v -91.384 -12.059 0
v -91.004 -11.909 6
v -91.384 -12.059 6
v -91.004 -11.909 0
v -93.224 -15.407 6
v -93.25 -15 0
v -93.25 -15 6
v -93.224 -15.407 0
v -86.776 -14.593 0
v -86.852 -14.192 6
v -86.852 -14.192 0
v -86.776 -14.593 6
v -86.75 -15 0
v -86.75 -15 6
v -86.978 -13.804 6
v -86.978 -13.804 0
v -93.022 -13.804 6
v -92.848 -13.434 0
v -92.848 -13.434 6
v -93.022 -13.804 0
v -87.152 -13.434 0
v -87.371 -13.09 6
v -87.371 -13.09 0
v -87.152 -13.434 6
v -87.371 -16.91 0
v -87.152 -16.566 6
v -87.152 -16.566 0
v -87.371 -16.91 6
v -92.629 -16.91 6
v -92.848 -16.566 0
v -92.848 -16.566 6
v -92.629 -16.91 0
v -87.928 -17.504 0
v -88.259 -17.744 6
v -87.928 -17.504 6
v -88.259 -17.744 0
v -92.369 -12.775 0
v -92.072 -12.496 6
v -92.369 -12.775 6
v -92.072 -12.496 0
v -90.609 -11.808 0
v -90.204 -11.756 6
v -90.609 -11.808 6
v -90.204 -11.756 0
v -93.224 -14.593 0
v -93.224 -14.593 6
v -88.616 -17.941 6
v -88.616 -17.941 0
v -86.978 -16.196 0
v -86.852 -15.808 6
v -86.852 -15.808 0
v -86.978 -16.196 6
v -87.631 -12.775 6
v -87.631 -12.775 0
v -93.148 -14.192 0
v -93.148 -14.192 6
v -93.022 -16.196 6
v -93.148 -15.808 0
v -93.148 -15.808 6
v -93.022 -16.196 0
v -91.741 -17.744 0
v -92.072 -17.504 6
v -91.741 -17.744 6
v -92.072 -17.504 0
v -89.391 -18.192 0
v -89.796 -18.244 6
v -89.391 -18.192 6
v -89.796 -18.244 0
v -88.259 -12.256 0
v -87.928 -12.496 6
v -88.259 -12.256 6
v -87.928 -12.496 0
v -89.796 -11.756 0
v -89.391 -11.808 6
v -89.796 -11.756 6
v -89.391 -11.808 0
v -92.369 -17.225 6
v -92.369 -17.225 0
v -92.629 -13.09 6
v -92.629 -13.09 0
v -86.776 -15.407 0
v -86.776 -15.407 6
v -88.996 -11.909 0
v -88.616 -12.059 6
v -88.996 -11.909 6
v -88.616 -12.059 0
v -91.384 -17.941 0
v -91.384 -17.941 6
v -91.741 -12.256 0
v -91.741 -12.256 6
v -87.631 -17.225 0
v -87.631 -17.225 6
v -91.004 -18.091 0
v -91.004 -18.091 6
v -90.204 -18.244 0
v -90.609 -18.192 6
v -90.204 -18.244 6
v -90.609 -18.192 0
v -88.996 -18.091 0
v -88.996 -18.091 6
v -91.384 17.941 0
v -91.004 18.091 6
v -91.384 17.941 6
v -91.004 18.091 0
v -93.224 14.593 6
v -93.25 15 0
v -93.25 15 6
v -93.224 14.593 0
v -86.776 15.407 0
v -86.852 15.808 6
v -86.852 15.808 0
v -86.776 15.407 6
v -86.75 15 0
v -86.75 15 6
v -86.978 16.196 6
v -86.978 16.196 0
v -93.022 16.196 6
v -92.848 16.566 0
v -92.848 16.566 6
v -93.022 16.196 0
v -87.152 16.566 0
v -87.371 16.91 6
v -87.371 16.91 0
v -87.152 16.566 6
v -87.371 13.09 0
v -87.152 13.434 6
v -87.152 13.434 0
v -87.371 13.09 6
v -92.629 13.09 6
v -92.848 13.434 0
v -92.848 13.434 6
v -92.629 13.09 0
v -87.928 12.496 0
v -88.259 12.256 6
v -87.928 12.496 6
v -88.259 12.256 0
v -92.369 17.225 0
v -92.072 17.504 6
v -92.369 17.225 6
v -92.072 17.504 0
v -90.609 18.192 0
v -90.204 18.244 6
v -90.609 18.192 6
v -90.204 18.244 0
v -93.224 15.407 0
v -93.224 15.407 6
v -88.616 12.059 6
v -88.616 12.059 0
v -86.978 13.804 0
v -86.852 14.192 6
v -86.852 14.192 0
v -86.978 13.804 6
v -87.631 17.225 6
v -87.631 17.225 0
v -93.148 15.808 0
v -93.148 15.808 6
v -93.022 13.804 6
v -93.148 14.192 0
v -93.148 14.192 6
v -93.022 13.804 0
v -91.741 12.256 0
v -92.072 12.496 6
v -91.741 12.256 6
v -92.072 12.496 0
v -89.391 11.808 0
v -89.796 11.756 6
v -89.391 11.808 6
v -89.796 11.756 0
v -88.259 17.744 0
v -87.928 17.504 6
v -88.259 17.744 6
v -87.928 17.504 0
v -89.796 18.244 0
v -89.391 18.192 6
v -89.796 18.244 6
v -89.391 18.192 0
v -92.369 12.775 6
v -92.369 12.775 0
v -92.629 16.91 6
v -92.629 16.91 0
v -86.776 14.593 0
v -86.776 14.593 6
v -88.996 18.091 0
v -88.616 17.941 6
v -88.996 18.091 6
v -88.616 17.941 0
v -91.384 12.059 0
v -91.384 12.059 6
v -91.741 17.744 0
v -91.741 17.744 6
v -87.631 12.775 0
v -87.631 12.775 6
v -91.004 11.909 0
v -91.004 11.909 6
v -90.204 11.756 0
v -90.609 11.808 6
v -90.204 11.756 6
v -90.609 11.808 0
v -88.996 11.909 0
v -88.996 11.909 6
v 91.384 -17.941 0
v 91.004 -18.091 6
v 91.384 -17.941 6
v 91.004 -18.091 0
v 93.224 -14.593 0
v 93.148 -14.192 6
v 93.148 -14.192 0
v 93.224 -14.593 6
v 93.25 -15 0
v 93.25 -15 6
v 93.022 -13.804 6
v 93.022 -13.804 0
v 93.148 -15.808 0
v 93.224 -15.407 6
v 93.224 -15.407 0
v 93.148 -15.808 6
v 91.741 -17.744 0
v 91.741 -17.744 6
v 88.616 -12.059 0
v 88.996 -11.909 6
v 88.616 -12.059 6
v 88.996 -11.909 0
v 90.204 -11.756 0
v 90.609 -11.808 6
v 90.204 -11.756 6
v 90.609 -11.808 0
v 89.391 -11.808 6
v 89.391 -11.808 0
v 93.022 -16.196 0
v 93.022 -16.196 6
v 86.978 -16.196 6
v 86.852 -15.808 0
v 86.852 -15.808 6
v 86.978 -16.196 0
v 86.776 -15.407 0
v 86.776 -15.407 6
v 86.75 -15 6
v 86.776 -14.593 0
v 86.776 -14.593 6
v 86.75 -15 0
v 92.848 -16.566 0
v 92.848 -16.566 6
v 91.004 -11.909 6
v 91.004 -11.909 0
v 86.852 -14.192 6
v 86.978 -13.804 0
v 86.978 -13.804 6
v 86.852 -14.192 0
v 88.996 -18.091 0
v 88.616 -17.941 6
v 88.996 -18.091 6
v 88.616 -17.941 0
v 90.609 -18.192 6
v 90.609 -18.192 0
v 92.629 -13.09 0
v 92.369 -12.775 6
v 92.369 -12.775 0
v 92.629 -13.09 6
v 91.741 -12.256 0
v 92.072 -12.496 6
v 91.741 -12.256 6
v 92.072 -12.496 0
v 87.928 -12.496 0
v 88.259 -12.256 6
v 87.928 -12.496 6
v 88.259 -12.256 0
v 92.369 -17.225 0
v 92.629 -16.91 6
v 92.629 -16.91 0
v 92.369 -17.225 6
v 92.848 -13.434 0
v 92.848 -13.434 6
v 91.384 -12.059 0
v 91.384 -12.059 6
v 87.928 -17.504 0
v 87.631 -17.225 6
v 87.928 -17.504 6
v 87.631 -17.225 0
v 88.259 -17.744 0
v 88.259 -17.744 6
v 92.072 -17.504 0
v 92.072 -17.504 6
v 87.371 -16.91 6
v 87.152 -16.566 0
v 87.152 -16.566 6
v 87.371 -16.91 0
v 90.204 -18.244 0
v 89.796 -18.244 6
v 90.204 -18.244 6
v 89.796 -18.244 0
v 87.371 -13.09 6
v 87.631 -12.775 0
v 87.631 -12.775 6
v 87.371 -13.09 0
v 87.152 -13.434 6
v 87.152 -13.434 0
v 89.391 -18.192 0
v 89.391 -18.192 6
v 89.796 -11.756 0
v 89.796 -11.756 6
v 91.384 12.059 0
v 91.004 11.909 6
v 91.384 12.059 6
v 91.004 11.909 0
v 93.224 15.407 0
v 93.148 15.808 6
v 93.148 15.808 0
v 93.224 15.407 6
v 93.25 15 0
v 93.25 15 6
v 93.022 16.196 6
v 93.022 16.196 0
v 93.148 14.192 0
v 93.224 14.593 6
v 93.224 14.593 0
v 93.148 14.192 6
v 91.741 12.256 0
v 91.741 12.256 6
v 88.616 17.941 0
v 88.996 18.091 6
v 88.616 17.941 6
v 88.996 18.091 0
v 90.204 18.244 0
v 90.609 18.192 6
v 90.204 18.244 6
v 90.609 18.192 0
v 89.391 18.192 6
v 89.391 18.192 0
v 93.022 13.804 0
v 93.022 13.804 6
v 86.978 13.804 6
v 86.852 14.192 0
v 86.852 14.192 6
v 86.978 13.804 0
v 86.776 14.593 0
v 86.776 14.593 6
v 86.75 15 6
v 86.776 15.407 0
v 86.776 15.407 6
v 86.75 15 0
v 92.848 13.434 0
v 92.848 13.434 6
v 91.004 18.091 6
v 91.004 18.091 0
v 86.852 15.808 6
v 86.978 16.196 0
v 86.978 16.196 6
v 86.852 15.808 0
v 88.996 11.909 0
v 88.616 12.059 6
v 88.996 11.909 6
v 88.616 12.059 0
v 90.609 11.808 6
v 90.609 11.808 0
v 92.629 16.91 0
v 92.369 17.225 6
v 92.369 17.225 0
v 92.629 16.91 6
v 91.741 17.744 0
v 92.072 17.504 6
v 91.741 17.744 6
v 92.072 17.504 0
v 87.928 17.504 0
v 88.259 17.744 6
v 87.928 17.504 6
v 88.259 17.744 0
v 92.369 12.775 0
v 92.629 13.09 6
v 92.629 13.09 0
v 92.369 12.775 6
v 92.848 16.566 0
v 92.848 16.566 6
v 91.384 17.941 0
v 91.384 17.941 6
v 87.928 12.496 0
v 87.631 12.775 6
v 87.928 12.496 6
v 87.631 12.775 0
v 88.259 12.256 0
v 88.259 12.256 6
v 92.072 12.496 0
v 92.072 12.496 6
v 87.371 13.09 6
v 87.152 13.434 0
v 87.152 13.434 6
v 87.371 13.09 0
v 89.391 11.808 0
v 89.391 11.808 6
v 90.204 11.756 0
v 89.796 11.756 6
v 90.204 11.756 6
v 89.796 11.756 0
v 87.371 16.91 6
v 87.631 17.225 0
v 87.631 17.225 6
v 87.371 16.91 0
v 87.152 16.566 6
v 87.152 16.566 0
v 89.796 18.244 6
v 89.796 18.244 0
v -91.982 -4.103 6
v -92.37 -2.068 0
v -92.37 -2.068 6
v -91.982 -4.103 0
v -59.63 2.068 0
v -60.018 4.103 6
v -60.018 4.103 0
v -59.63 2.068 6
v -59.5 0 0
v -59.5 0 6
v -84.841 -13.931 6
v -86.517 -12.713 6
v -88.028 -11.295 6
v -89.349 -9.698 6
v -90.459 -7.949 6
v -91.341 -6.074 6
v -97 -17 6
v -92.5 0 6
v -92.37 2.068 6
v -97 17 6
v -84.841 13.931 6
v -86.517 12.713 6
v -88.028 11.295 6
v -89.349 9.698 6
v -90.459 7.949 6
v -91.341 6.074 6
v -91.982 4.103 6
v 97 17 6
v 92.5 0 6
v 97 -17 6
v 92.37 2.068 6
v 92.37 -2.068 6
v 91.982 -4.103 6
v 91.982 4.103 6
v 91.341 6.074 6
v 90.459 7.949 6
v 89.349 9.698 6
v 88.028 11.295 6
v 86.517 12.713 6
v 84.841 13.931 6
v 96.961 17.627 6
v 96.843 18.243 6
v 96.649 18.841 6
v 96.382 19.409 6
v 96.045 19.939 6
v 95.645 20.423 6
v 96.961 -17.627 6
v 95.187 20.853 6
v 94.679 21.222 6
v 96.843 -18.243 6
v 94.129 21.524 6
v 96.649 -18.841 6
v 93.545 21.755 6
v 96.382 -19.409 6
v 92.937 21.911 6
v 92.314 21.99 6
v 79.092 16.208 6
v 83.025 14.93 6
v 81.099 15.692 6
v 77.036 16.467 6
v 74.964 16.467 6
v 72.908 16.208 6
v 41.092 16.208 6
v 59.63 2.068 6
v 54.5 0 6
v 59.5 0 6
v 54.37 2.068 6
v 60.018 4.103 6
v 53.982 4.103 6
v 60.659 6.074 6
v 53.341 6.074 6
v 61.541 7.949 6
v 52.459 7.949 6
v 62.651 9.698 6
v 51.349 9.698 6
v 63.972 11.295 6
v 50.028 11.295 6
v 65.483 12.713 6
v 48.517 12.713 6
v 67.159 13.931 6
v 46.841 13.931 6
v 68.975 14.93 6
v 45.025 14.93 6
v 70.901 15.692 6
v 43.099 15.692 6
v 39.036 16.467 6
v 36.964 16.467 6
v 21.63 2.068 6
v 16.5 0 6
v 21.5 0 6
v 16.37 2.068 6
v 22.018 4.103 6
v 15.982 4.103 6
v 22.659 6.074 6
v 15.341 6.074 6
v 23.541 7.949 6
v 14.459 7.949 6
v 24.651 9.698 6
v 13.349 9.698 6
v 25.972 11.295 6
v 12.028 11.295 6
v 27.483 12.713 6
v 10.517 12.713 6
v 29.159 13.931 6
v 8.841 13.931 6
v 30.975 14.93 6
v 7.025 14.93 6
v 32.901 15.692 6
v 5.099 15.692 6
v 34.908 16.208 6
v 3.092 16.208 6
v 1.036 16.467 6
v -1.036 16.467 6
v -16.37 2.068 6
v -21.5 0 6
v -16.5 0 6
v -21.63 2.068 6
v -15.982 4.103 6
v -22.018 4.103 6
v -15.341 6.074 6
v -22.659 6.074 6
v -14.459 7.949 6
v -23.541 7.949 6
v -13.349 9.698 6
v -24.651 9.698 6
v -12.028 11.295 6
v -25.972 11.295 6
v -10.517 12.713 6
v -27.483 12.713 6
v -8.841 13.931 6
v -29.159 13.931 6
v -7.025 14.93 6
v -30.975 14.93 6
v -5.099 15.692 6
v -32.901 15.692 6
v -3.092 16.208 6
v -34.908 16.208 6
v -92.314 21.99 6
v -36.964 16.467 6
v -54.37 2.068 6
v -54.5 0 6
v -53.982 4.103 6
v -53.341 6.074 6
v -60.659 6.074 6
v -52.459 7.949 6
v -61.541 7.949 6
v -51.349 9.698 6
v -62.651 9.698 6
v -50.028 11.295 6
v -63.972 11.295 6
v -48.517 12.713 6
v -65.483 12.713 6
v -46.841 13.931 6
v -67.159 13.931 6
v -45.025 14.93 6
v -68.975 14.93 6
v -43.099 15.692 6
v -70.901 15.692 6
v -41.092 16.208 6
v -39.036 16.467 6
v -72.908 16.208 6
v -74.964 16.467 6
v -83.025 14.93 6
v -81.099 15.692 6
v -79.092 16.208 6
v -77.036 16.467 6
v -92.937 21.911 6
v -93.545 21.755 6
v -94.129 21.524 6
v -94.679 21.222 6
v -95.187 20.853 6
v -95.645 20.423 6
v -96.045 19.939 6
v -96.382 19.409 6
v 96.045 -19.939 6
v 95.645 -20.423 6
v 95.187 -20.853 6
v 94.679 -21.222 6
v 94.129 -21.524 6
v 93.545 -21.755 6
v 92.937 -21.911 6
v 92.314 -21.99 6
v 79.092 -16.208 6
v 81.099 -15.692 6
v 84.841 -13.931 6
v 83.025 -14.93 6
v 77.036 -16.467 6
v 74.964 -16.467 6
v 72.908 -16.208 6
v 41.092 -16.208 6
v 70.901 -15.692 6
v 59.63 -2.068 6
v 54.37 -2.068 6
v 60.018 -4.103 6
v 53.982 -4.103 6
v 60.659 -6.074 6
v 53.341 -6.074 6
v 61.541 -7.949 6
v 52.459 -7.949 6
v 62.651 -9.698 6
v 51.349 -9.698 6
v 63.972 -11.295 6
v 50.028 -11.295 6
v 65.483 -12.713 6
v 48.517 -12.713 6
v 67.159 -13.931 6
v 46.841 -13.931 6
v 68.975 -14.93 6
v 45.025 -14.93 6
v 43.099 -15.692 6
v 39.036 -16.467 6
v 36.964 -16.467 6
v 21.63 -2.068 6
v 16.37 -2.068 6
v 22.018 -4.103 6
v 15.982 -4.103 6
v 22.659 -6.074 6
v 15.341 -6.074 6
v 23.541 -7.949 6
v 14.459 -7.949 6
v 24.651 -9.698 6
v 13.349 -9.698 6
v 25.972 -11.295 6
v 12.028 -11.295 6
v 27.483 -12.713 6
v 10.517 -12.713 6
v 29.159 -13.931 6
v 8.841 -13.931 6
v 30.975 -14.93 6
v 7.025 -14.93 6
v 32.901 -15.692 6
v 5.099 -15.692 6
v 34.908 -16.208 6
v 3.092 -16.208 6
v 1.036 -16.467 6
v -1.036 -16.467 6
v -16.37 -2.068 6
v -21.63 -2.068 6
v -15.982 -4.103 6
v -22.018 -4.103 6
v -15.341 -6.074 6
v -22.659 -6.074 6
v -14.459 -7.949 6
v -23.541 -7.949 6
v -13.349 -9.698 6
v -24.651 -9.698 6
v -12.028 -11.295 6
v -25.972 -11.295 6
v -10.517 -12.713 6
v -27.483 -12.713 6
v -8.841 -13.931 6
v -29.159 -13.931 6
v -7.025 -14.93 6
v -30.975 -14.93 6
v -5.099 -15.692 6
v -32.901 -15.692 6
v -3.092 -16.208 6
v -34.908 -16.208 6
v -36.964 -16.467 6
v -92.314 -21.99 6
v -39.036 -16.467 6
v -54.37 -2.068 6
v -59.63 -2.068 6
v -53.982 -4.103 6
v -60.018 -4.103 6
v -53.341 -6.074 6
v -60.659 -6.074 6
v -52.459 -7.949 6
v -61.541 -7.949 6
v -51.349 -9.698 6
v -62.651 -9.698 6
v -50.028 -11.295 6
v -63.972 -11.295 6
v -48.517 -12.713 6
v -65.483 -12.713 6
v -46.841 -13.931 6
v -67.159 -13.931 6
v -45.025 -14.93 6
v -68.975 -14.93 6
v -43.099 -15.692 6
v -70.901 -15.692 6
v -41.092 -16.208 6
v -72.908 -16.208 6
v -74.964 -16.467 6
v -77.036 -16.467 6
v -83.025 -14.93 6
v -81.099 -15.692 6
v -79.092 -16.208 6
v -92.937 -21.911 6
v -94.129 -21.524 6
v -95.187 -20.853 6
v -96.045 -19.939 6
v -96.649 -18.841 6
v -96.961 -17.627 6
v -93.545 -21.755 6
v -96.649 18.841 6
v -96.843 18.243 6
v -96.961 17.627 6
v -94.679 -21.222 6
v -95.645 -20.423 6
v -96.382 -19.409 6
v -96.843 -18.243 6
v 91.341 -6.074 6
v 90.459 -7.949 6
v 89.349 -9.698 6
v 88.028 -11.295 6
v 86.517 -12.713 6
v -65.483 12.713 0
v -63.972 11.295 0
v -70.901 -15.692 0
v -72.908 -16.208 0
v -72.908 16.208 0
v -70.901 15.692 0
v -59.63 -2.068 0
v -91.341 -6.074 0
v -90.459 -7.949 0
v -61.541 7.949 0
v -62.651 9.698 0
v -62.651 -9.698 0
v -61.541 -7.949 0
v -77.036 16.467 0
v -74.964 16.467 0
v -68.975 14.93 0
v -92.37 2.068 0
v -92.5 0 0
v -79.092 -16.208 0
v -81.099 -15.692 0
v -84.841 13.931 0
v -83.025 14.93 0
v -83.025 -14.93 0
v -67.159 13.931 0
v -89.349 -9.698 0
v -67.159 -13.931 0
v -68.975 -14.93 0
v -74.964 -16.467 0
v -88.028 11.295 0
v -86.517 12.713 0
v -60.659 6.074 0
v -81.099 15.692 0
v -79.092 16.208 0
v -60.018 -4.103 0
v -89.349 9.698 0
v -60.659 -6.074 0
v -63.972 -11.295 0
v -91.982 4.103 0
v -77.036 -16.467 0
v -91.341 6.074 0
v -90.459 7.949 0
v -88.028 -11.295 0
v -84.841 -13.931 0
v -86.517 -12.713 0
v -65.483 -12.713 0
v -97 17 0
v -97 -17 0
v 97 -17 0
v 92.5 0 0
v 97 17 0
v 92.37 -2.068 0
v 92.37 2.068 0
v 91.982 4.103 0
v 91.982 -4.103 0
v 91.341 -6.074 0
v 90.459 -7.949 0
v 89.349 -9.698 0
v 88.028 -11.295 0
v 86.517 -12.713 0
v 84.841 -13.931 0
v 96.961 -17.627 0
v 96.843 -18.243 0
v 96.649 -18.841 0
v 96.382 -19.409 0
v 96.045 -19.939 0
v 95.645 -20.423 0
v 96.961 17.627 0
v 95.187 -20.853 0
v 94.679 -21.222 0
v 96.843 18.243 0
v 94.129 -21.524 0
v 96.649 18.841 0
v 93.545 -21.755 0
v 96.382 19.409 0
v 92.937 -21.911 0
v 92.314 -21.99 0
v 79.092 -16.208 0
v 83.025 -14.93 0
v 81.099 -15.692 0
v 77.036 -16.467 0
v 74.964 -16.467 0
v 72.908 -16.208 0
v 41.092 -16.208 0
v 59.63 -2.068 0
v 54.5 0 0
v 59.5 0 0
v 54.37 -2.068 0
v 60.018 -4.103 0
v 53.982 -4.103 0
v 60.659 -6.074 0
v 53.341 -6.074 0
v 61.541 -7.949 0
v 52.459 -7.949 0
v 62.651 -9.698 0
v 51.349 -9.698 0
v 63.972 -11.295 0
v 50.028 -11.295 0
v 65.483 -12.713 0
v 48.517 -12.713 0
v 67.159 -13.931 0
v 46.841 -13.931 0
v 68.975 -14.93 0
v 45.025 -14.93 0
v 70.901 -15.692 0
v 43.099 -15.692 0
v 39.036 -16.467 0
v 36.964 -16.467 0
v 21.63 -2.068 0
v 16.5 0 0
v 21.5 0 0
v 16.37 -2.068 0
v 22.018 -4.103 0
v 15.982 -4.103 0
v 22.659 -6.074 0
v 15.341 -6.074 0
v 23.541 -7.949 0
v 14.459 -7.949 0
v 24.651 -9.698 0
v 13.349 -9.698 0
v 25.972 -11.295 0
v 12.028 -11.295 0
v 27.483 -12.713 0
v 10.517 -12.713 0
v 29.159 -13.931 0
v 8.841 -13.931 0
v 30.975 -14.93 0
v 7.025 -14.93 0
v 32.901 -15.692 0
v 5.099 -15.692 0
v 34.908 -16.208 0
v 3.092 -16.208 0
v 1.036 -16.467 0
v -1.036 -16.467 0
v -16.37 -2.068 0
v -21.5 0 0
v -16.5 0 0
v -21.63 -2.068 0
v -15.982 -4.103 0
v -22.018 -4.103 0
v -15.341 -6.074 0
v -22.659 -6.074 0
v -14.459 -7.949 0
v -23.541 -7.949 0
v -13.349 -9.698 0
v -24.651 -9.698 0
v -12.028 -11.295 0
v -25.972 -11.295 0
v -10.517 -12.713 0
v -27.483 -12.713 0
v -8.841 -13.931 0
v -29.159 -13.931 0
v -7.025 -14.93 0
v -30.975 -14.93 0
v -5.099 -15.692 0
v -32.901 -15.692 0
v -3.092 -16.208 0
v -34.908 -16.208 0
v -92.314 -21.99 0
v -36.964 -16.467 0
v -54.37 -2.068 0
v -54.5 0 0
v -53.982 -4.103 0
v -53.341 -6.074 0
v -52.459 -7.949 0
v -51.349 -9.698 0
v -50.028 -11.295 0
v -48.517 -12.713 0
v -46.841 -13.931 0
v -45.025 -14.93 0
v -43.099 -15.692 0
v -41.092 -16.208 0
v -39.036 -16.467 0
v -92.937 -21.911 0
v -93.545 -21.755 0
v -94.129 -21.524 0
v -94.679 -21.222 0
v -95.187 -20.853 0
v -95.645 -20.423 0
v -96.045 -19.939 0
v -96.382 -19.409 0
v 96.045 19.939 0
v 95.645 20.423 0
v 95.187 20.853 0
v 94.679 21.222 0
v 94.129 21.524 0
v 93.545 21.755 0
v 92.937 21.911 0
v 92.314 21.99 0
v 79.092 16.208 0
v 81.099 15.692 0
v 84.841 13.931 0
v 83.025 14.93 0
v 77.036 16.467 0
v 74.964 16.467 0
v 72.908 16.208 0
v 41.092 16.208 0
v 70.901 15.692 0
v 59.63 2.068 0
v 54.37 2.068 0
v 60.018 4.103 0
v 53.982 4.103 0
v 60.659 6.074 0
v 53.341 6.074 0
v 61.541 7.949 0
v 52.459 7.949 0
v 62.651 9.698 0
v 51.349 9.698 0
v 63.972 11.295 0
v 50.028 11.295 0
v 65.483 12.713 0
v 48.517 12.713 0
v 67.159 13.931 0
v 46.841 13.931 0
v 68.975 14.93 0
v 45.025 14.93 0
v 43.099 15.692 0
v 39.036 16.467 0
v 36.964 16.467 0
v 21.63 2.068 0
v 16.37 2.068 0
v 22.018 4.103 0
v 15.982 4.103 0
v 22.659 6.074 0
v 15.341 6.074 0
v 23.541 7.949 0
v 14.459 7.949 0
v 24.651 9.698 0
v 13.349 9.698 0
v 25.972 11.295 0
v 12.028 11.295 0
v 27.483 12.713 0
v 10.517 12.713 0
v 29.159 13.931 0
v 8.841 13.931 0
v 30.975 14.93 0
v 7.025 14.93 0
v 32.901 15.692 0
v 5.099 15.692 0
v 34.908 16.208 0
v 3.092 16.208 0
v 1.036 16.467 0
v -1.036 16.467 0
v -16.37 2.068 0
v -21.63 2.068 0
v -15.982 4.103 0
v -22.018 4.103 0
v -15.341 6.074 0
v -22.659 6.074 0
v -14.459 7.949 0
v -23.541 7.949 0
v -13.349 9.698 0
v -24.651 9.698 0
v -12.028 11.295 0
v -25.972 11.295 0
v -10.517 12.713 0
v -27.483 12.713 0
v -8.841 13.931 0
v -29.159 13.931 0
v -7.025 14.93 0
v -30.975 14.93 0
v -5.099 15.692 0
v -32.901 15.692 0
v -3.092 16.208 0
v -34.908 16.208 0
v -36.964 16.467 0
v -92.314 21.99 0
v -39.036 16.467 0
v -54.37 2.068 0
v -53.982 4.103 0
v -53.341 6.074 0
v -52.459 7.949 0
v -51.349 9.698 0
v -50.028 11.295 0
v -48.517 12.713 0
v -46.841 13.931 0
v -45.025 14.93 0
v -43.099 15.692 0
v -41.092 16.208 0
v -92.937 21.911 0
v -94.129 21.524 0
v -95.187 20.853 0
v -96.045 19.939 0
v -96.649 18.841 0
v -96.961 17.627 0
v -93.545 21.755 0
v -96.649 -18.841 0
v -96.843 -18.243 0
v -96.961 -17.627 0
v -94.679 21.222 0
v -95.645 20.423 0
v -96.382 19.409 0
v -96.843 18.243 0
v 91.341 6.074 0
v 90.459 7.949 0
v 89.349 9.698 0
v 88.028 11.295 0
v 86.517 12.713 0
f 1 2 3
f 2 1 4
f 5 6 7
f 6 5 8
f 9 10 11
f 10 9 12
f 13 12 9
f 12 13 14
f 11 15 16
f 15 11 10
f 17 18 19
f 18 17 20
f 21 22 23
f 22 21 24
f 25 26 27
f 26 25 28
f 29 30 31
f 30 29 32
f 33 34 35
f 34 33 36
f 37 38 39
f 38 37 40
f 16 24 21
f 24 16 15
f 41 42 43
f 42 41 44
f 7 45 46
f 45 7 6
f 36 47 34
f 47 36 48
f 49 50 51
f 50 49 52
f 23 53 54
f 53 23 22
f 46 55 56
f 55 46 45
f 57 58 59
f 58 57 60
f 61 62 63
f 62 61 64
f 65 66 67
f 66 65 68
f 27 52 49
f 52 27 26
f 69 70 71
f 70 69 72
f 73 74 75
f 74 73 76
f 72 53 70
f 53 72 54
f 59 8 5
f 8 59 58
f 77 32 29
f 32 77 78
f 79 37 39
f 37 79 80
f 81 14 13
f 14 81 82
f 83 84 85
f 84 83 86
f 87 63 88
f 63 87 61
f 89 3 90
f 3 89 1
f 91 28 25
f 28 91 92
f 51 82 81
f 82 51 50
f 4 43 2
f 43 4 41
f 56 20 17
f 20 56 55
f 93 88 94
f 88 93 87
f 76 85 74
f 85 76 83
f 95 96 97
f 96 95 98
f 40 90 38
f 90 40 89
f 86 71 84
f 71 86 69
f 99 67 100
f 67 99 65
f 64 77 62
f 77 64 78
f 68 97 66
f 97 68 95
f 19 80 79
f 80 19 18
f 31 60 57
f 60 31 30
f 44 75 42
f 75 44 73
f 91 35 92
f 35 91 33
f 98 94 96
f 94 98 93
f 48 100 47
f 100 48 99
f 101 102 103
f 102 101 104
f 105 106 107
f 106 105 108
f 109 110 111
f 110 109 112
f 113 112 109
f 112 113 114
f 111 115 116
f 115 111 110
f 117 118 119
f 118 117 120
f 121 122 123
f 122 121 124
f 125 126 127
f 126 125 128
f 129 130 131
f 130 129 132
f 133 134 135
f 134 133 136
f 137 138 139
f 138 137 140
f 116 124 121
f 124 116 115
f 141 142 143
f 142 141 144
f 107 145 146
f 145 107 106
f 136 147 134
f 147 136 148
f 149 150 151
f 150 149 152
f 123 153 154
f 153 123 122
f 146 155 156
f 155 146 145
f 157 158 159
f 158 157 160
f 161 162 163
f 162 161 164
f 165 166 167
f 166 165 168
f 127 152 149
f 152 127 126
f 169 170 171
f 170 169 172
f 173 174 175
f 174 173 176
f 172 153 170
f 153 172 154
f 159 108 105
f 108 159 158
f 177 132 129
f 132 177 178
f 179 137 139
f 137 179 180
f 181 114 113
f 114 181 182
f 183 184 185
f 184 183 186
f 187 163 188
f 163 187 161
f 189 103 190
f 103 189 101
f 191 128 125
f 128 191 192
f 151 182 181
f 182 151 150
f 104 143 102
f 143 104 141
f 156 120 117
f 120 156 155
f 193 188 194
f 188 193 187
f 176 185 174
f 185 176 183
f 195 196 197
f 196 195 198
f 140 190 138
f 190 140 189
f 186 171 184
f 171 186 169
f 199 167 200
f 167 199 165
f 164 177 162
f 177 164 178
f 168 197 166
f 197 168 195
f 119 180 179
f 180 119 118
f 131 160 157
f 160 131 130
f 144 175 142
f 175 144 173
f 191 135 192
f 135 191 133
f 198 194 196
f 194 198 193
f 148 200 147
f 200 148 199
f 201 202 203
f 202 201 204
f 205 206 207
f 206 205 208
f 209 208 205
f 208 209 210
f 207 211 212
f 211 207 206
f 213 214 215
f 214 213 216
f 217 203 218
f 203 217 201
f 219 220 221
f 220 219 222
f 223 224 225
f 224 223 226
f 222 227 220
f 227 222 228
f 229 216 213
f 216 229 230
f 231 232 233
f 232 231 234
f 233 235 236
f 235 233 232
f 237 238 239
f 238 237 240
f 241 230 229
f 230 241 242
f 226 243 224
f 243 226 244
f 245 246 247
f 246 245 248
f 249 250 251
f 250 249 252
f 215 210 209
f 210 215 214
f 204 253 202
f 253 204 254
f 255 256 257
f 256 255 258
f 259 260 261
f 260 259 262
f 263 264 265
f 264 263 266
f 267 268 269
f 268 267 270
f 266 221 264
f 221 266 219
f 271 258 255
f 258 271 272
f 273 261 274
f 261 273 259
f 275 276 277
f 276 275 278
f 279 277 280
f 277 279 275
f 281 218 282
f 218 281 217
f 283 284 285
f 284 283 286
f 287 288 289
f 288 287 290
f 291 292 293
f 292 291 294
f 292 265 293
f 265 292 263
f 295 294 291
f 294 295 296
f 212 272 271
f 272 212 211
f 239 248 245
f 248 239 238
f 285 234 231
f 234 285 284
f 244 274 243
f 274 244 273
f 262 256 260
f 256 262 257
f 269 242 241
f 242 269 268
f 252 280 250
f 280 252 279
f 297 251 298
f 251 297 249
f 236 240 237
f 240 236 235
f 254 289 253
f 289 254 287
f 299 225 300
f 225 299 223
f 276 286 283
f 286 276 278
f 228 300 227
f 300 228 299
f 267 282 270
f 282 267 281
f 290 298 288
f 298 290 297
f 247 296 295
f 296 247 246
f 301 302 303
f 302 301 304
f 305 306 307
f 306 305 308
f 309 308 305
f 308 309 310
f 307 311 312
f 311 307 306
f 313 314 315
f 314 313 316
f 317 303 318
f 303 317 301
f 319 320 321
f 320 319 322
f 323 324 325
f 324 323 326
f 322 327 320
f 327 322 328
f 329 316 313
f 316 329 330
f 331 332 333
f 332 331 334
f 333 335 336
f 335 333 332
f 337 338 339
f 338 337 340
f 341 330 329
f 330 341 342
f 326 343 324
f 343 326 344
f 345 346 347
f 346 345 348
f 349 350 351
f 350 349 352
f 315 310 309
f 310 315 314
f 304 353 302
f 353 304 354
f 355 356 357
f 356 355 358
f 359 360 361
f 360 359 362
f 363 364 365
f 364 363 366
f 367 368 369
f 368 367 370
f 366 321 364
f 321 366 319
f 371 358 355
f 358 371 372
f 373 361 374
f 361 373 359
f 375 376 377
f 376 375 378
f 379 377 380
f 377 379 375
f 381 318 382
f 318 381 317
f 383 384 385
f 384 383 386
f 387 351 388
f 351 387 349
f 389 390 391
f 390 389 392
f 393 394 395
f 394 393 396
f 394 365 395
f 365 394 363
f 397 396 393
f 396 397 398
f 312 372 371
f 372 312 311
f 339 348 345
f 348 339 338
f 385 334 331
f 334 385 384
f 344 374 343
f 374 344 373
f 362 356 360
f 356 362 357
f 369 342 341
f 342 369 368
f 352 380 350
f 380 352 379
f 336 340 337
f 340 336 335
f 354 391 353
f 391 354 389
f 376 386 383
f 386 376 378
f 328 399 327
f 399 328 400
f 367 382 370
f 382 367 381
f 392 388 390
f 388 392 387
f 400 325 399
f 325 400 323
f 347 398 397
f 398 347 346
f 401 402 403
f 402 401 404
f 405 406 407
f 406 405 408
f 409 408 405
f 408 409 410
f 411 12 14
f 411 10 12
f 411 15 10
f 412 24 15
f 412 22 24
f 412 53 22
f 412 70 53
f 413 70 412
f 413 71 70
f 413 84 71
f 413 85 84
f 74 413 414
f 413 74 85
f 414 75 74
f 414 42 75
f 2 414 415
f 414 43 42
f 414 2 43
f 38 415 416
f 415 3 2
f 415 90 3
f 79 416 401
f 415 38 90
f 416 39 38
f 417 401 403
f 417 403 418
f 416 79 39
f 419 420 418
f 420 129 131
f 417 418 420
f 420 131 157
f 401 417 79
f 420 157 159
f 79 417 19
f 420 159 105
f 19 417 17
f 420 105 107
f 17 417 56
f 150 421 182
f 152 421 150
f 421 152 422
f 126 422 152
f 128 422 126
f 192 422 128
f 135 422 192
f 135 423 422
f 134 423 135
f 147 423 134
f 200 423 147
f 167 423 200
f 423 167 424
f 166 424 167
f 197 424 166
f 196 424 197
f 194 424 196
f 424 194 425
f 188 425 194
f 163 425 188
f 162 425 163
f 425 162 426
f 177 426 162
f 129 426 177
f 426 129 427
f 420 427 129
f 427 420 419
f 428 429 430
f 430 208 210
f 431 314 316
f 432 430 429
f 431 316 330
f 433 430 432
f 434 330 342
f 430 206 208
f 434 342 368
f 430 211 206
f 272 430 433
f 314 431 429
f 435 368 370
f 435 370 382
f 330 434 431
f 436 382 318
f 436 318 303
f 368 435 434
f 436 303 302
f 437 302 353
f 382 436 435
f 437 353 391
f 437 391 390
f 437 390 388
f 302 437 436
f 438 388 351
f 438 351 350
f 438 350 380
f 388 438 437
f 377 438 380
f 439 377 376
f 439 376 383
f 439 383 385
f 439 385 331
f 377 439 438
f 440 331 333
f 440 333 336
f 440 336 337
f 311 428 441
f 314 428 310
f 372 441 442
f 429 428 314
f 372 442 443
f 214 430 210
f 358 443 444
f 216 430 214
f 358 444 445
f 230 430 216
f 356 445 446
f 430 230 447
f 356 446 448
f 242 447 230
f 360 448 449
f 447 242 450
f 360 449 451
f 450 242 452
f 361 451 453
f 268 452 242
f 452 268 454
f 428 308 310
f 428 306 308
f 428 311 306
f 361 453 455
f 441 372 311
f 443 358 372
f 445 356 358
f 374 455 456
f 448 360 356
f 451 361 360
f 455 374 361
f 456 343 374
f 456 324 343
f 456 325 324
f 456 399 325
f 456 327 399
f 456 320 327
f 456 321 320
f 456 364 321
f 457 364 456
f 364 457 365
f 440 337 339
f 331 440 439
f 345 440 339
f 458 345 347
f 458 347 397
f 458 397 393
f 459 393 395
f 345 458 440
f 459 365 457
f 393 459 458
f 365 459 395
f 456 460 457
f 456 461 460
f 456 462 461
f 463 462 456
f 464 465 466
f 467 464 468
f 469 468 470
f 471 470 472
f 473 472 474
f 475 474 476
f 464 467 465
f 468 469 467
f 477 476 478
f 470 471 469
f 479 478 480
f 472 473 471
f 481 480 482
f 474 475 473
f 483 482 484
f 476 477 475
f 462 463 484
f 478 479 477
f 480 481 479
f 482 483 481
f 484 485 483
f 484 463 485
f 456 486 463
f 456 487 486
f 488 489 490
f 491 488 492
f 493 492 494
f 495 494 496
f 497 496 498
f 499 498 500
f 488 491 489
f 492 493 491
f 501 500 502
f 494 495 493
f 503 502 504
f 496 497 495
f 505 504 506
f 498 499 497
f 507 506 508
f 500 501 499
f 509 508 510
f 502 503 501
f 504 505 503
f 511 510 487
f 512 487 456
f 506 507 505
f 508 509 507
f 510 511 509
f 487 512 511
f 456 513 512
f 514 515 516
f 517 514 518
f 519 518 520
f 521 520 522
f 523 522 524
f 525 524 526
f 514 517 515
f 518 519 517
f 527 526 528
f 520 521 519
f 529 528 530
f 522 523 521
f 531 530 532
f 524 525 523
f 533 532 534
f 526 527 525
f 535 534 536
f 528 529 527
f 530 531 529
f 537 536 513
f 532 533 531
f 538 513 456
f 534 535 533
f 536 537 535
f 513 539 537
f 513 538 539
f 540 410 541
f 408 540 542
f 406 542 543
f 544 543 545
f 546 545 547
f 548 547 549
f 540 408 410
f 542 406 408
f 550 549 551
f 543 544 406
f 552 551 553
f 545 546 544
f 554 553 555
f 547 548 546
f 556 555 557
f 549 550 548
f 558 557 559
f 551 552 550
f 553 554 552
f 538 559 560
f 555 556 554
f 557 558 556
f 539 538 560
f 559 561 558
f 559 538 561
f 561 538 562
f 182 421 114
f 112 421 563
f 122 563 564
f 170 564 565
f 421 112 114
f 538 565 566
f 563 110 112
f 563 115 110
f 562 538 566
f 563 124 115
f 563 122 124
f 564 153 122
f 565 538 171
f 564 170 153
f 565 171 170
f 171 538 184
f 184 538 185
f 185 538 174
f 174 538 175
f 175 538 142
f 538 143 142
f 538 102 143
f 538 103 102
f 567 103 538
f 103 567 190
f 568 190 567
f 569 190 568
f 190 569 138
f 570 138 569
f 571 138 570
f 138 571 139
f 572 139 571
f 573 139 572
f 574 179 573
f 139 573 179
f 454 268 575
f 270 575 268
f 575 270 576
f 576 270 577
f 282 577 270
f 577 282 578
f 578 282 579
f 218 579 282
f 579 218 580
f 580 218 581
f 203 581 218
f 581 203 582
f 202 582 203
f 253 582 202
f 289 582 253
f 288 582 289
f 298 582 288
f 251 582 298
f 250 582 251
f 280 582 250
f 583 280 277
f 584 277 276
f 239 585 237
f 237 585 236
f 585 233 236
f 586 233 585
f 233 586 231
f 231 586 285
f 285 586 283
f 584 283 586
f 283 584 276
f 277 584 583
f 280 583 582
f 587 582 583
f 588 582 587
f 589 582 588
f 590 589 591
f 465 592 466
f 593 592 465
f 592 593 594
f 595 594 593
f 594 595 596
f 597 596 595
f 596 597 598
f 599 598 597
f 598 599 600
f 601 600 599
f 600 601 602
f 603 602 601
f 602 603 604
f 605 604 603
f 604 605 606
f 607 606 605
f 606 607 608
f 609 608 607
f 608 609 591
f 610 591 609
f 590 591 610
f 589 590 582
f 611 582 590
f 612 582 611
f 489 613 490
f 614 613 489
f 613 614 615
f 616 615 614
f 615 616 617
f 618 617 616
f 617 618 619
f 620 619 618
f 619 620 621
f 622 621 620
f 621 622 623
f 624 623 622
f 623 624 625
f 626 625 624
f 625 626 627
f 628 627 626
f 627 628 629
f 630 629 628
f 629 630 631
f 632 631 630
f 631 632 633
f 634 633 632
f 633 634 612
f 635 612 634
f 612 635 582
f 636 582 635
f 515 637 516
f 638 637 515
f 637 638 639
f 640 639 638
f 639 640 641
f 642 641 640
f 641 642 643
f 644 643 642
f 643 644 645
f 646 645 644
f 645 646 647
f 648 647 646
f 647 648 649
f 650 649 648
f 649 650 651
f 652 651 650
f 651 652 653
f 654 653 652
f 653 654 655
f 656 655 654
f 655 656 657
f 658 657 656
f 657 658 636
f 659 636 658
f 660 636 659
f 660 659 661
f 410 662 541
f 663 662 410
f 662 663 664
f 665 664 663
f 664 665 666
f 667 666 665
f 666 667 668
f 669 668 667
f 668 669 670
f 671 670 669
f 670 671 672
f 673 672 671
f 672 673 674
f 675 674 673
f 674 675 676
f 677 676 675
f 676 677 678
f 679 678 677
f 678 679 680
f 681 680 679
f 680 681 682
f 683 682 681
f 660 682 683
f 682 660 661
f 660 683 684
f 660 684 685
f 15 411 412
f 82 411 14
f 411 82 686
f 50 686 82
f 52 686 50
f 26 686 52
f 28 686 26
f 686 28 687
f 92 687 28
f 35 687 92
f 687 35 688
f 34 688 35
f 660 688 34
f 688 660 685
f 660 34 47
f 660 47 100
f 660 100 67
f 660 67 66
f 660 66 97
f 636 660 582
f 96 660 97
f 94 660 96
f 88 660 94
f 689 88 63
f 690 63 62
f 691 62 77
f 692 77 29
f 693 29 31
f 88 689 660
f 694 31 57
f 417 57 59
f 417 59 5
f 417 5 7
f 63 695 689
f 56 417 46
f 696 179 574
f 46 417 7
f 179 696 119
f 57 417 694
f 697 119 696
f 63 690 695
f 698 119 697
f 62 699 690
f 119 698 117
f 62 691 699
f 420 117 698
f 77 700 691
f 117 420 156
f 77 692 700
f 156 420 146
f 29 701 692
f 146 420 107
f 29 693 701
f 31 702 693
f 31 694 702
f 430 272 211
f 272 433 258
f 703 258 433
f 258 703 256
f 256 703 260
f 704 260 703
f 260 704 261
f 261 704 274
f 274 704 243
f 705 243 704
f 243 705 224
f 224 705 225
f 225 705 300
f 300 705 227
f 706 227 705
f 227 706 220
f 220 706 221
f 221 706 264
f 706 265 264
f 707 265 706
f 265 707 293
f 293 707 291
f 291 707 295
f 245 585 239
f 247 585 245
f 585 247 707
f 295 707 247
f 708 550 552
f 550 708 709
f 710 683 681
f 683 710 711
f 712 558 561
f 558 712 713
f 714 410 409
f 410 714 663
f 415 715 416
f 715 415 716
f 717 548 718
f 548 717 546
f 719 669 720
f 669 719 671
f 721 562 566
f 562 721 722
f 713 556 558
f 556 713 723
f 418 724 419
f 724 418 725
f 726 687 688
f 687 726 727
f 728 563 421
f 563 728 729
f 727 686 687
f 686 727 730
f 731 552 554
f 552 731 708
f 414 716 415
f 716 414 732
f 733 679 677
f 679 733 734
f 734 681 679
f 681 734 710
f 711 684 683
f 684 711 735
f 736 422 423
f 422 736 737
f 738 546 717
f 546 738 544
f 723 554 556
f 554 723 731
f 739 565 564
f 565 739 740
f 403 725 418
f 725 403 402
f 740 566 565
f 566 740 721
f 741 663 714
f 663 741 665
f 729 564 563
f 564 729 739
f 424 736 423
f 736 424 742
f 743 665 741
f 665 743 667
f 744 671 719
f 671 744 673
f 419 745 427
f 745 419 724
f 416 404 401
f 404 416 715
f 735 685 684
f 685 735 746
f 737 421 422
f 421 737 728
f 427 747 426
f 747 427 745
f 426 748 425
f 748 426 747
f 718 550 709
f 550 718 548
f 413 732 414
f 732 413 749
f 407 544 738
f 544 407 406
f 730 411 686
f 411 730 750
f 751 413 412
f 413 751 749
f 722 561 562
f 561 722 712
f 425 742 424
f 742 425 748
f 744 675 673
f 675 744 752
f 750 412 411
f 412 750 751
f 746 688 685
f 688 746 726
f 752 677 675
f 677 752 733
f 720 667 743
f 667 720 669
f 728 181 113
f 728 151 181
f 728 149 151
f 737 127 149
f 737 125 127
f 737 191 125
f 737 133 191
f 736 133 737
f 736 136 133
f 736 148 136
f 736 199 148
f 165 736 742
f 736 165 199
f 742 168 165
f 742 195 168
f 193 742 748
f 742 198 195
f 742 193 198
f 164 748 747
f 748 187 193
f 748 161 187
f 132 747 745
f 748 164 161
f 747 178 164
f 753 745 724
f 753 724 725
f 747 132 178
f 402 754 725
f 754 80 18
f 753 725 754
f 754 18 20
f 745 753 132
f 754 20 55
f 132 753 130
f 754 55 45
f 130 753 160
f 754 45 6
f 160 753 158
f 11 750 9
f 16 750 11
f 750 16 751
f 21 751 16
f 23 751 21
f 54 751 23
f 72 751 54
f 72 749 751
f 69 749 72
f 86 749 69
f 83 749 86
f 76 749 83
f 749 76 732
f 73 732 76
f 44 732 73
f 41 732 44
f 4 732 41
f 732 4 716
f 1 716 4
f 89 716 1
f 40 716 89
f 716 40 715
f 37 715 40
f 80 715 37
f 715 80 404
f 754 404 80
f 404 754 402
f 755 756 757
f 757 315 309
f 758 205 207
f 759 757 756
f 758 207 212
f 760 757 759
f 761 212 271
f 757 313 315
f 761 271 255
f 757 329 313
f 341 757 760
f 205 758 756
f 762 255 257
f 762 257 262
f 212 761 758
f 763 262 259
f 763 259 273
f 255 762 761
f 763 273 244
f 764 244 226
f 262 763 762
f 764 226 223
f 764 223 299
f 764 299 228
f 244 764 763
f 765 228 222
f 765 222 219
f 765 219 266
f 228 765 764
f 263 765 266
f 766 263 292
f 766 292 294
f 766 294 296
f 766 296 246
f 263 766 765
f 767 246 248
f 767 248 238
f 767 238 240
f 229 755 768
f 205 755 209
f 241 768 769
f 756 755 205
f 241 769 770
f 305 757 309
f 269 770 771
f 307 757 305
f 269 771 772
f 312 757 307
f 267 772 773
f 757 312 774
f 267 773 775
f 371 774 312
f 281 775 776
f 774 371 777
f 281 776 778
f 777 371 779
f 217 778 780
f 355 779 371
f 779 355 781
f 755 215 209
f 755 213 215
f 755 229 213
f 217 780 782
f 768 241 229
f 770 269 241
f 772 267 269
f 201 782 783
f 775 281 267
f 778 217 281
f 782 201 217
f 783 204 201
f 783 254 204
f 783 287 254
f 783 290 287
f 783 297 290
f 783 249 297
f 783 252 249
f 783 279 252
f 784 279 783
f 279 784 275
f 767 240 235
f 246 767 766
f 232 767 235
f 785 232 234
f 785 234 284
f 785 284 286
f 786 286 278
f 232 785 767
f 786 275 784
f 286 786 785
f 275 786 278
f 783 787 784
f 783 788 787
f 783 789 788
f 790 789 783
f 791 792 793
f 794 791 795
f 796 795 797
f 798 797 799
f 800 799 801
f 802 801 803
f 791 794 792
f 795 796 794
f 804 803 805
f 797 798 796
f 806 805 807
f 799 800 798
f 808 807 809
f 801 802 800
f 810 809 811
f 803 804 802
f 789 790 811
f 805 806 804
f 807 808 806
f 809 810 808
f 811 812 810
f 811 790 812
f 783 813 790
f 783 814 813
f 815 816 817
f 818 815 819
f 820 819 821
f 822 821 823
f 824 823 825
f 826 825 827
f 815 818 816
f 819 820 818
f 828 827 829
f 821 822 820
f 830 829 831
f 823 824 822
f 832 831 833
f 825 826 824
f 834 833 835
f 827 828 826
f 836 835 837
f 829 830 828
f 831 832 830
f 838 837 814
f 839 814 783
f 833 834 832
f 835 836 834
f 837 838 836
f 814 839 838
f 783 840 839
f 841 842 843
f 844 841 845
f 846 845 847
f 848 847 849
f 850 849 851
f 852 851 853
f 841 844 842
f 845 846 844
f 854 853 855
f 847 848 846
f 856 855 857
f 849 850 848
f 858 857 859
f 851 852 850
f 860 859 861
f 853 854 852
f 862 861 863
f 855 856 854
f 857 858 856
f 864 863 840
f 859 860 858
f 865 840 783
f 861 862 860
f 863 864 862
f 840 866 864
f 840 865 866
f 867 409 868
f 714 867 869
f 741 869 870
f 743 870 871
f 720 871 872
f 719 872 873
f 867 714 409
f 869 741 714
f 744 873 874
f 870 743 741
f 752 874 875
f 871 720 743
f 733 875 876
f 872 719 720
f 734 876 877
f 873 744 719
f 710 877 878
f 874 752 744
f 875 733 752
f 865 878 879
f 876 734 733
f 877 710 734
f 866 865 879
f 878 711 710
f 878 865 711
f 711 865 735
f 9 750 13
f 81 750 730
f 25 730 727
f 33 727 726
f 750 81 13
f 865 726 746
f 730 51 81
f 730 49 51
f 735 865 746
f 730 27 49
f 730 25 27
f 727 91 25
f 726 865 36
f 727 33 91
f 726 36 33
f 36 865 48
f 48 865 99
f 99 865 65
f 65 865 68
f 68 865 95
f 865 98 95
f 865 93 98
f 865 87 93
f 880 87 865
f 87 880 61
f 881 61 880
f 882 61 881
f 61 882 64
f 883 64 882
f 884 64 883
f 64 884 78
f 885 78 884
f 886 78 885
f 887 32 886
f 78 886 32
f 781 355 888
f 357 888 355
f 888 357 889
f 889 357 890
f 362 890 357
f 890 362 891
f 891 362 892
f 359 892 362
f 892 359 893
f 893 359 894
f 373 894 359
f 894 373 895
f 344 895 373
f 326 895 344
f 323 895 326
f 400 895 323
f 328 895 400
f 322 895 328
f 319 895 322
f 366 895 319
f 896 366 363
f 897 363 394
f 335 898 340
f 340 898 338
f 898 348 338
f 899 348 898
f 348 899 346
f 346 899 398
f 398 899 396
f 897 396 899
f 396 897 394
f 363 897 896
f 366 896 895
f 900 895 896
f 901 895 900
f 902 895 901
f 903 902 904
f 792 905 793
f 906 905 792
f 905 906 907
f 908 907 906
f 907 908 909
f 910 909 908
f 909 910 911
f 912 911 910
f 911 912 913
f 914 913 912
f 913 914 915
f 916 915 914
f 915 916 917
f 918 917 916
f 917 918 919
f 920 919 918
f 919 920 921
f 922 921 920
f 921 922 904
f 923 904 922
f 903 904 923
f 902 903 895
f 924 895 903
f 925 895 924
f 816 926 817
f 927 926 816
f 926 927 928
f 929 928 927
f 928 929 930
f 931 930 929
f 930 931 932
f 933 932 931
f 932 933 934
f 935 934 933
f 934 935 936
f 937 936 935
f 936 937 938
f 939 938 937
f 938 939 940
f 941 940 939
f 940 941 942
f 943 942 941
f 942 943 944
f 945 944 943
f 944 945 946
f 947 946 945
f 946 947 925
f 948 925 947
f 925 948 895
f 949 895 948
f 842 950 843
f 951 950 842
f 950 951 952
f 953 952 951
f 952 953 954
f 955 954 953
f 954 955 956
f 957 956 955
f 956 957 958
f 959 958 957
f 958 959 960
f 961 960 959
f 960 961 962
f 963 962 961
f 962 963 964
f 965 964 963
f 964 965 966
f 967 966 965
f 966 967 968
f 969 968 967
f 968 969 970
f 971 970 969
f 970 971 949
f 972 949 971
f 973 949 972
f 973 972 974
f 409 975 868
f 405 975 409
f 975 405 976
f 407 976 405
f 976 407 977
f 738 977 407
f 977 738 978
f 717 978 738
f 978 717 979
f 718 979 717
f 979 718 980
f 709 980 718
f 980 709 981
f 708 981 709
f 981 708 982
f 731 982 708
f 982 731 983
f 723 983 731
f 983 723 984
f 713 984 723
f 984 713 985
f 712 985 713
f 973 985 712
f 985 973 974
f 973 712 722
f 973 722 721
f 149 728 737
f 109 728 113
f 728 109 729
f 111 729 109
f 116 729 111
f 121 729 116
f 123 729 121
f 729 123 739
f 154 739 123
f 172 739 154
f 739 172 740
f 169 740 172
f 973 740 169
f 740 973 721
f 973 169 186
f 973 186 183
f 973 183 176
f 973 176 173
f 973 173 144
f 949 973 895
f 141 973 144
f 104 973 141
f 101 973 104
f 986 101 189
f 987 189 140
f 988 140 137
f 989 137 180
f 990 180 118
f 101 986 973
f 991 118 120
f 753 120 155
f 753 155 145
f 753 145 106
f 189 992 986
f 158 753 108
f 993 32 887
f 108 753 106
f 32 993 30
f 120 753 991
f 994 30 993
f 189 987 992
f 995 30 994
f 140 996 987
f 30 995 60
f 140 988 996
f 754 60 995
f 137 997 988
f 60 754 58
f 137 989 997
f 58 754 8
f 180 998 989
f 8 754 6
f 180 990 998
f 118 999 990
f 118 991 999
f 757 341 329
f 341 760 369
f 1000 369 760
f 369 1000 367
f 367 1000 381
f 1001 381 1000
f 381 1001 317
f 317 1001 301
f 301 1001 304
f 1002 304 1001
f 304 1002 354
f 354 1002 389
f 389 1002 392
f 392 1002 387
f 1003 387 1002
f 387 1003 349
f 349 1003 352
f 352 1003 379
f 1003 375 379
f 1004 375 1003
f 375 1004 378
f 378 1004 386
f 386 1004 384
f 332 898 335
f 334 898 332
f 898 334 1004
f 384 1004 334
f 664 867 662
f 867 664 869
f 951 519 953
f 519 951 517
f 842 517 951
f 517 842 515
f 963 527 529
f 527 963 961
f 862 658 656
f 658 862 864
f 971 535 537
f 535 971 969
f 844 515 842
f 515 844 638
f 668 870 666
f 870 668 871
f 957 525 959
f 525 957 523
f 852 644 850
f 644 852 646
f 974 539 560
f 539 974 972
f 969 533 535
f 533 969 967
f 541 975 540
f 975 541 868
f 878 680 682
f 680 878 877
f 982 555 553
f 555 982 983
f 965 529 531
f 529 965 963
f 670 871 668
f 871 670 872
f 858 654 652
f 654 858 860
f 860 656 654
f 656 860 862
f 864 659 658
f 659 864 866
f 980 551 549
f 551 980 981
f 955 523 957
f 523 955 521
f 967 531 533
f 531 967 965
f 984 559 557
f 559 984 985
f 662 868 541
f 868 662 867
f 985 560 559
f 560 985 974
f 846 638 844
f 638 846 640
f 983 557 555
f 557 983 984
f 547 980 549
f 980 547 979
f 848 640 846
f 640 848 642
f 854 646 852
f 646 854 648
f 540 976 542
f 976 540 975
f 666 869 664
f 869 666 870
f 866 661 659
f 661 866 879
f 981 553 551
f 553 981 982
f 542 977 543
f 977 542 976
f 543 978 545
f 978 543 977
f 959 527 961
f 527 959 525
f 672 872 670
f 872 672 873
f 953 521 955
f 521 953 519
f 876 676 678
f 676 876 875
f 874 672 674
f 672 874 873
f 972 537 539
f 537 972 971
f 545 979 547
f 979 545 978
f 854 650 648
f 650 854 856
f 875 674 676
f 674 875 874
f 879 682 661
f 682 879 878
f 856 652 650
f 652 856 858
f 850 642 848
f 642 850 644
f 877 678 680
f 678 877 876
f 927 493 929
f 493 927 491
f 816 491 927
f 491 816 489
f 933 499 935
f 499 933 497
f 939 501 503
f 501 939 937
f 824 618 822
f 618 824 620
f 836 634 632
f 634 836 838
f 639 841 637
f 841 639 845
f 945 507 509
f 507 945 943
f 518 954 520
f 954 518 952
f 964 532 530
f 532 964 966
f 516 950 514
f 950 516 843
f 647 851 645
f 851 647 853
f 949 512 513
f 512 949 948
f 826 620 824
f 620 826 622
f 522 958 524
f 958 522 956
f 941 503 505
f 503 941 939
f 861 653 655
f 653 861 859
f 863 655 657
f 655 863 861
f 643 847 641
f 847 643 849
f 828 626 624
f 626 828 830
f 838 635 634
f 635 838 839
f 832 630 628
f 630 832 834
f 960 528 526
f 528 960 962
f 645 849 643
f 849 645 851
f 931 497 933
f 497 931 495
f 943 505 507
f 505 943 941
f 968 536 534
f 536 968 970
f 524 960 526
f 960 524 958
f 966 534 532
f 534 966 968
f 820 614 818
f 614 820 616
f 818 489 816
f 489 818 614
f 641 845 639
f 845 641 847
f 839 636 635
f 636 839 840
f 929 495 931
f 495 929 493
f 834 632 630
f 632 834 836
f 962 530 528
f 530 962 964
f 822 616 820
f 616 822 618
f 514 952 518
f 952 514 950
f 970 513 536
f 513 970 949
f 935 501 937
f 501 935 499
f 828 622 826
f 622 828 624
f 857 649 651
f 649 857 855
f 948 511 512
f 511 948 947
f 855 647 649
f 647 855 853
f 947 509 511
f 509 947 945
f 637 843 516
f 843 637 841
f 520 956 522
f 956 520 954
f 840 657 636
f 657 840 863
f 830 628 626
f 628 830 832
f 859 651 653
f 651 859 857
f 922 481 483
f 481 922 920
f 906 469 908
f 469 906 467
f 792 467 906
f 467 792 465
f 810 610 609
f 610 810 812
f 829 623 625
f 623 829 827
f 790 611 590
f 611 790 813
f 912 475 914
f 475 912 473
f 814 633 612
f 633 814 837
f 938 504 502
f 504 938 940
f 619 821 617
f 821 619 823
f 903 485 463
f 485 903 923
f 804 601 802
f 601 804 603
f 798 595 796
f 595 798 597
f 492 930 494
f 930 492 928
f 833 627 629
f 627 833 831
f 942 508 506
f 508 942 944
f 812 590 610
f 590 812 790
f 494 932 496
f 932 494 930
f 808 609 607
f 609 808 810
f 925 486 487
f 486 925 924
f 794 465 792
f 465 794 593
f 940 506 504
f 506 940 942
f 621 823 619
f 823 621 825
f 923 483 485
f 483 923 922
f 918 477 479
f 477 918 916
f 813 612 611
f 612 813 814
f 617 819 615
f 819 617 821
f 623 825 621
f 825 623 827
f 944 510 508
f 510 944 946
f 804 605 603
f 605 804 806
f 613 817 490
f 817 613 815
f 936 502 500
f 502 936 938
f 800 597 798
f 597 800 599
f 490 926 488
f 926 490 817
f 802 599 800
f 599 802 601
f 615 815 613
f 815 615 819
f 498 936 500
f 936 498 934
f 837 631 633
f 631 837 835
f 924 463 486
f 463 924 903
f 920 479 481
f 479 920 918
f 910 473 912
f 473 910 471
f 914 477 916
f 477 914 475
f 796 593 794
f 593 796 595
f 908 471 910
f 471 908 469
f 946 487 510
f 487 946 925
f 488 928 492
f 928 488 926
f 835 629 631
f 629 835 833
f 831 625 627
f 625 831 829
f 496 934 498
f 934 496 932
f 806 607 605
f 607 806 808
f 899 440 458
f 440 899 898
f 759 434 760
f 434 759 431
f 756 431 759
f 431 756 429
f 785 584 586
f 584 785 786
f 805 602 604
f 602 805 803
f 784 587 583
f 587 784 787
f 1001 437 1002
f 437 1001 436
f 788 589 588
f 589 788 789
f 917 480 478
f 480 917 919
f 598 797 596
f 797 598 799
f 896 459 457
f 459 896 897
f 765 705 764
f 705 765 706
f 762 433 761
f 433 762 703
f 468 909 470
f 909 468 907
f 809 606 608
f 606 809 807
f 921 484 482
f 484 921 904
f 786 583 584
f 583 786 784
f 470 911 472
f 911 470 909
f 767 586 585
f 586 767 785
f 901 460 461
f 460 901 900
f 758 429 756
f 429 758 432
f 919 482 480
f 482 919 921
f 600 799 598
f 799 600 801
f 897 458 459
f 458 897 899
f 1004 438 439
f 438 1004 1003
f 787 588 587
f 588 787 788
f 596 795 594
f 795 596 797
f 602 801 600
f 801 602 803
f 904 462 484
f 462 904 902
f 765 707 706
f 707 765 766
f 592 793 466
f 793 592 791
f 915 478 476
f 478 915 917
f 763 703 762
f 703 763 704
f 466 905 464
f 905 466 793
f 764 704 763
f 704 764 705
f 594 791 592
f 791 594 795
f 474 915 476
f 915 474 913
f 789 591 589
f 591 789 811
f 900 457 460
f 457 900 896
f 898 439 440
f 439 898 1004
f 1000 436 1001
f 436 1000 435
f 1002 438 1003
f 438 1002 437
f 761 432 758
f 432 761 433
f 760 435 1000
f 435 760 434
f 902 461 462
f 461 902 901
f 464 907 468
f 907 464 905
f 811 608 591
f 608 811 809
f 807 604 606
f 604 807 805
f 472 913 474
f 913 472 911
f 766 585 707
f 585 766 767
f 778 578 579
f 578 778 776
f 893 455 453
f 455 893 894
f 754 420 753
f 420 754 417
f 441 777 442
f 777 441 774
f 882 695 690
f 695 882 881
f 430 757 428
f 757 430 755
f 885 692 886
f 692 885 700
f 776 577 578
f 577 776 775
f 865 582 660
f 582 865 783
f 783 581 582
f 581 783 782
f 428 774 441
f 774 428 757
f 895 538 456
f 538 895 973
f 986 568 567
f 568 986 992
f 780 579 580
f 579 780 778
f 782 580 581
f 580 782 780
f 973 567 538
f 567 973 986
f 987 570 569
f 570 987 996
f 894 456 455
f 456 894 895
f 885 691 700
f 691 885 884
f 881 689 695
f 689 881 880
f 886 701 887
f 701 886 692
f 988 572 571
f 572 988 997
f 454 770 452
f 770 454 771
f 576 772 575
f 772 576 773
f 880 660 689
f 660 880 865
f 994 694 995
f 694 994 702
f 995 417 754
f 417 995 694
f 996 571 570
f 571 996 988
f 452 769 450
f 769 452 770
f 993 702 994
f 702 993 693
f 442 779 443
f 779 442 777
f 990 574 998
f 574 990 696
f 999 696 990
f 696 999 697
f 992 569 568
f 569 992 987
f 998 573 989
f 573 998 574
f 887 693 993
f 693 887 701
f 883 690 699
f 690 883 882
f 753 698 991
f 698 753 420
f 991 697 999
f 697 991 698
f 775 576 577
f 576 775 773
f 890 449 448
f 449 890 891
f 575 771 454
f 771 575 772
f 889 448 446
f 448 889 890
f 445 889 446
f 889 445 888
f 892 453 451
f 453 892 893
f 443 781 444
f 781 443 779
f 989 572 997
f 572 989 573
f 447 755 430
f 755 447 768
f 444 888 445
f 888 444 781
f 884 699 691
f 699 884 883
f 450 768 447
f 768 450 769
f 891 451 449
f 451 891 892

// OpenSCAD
$fn = 50;

difference() {
	union() {
		hull() {
			translate(v = [-92.0, 17.0, 0]) {
				cylinder(h = 6, r = 5);
			}
			translate(v = [92.0, 17.0, 0]) {
				cylinder(h = 6, r = 5);
			}
			translate(v = [-92.0, -17.0, 0]) {
				cylinder(h = 6, r = 5);
			}
			translate(v = [92.0, -17.0, 0]) {
				cylinder(h = 6, r = 5);
			}
		}
	}
	union() {
		translate(v = [-90.0, -15.0, -100.0]) {
			cylinder(h = 200, r = 3.25);
		}
		translate(v = [-90.0, 15.0, -100.0]) {
			cylinder(h = 200, r = 3.25);
		}
		translate(v = [90.0, -15.0, -100.0]) {
			cylinder(h = 200, r = 3.25);
		}
		translate(v = [90.0, 15.0, -100.0]) {
			cylinder(h = 200, r = 3.25);
		}
		translate(v = [-90.0, -15.0, -100.0]) {
			cylinder(h = 200, r = 1.8);
		}
		translate(v = [-90.0, 15.0, -100.0]) {
			cylinder(h = 200, r = 1.8);
		}
		translate(v = [90.0, -15.0, -100.0]) {
			cylinder(h = 200, r = 1.8);
		}
		translate(v = [90.0, 15.0, -100.0]) {
			cylinder(h = 200, r = 1.8);
		}
		translate(v = [-76.0, 0, 0.0]) {
			cylinder(h = 6, r = 16.5);
		}
		translate(v = [-38.0, 0, 0.0]) {
			cylinder(h = 6, r = 16.5);
		}
		cylinder(h = 6, r = 16.5);
		translate(v = [38.0, 0, 0.0]) {
			cylinder(h = 6, r = 16.5);
		}
		translate(v = [76.0, 0, 0.0]) {
			cylinder(h = 6, r = 16.5);
		}
	}
}
